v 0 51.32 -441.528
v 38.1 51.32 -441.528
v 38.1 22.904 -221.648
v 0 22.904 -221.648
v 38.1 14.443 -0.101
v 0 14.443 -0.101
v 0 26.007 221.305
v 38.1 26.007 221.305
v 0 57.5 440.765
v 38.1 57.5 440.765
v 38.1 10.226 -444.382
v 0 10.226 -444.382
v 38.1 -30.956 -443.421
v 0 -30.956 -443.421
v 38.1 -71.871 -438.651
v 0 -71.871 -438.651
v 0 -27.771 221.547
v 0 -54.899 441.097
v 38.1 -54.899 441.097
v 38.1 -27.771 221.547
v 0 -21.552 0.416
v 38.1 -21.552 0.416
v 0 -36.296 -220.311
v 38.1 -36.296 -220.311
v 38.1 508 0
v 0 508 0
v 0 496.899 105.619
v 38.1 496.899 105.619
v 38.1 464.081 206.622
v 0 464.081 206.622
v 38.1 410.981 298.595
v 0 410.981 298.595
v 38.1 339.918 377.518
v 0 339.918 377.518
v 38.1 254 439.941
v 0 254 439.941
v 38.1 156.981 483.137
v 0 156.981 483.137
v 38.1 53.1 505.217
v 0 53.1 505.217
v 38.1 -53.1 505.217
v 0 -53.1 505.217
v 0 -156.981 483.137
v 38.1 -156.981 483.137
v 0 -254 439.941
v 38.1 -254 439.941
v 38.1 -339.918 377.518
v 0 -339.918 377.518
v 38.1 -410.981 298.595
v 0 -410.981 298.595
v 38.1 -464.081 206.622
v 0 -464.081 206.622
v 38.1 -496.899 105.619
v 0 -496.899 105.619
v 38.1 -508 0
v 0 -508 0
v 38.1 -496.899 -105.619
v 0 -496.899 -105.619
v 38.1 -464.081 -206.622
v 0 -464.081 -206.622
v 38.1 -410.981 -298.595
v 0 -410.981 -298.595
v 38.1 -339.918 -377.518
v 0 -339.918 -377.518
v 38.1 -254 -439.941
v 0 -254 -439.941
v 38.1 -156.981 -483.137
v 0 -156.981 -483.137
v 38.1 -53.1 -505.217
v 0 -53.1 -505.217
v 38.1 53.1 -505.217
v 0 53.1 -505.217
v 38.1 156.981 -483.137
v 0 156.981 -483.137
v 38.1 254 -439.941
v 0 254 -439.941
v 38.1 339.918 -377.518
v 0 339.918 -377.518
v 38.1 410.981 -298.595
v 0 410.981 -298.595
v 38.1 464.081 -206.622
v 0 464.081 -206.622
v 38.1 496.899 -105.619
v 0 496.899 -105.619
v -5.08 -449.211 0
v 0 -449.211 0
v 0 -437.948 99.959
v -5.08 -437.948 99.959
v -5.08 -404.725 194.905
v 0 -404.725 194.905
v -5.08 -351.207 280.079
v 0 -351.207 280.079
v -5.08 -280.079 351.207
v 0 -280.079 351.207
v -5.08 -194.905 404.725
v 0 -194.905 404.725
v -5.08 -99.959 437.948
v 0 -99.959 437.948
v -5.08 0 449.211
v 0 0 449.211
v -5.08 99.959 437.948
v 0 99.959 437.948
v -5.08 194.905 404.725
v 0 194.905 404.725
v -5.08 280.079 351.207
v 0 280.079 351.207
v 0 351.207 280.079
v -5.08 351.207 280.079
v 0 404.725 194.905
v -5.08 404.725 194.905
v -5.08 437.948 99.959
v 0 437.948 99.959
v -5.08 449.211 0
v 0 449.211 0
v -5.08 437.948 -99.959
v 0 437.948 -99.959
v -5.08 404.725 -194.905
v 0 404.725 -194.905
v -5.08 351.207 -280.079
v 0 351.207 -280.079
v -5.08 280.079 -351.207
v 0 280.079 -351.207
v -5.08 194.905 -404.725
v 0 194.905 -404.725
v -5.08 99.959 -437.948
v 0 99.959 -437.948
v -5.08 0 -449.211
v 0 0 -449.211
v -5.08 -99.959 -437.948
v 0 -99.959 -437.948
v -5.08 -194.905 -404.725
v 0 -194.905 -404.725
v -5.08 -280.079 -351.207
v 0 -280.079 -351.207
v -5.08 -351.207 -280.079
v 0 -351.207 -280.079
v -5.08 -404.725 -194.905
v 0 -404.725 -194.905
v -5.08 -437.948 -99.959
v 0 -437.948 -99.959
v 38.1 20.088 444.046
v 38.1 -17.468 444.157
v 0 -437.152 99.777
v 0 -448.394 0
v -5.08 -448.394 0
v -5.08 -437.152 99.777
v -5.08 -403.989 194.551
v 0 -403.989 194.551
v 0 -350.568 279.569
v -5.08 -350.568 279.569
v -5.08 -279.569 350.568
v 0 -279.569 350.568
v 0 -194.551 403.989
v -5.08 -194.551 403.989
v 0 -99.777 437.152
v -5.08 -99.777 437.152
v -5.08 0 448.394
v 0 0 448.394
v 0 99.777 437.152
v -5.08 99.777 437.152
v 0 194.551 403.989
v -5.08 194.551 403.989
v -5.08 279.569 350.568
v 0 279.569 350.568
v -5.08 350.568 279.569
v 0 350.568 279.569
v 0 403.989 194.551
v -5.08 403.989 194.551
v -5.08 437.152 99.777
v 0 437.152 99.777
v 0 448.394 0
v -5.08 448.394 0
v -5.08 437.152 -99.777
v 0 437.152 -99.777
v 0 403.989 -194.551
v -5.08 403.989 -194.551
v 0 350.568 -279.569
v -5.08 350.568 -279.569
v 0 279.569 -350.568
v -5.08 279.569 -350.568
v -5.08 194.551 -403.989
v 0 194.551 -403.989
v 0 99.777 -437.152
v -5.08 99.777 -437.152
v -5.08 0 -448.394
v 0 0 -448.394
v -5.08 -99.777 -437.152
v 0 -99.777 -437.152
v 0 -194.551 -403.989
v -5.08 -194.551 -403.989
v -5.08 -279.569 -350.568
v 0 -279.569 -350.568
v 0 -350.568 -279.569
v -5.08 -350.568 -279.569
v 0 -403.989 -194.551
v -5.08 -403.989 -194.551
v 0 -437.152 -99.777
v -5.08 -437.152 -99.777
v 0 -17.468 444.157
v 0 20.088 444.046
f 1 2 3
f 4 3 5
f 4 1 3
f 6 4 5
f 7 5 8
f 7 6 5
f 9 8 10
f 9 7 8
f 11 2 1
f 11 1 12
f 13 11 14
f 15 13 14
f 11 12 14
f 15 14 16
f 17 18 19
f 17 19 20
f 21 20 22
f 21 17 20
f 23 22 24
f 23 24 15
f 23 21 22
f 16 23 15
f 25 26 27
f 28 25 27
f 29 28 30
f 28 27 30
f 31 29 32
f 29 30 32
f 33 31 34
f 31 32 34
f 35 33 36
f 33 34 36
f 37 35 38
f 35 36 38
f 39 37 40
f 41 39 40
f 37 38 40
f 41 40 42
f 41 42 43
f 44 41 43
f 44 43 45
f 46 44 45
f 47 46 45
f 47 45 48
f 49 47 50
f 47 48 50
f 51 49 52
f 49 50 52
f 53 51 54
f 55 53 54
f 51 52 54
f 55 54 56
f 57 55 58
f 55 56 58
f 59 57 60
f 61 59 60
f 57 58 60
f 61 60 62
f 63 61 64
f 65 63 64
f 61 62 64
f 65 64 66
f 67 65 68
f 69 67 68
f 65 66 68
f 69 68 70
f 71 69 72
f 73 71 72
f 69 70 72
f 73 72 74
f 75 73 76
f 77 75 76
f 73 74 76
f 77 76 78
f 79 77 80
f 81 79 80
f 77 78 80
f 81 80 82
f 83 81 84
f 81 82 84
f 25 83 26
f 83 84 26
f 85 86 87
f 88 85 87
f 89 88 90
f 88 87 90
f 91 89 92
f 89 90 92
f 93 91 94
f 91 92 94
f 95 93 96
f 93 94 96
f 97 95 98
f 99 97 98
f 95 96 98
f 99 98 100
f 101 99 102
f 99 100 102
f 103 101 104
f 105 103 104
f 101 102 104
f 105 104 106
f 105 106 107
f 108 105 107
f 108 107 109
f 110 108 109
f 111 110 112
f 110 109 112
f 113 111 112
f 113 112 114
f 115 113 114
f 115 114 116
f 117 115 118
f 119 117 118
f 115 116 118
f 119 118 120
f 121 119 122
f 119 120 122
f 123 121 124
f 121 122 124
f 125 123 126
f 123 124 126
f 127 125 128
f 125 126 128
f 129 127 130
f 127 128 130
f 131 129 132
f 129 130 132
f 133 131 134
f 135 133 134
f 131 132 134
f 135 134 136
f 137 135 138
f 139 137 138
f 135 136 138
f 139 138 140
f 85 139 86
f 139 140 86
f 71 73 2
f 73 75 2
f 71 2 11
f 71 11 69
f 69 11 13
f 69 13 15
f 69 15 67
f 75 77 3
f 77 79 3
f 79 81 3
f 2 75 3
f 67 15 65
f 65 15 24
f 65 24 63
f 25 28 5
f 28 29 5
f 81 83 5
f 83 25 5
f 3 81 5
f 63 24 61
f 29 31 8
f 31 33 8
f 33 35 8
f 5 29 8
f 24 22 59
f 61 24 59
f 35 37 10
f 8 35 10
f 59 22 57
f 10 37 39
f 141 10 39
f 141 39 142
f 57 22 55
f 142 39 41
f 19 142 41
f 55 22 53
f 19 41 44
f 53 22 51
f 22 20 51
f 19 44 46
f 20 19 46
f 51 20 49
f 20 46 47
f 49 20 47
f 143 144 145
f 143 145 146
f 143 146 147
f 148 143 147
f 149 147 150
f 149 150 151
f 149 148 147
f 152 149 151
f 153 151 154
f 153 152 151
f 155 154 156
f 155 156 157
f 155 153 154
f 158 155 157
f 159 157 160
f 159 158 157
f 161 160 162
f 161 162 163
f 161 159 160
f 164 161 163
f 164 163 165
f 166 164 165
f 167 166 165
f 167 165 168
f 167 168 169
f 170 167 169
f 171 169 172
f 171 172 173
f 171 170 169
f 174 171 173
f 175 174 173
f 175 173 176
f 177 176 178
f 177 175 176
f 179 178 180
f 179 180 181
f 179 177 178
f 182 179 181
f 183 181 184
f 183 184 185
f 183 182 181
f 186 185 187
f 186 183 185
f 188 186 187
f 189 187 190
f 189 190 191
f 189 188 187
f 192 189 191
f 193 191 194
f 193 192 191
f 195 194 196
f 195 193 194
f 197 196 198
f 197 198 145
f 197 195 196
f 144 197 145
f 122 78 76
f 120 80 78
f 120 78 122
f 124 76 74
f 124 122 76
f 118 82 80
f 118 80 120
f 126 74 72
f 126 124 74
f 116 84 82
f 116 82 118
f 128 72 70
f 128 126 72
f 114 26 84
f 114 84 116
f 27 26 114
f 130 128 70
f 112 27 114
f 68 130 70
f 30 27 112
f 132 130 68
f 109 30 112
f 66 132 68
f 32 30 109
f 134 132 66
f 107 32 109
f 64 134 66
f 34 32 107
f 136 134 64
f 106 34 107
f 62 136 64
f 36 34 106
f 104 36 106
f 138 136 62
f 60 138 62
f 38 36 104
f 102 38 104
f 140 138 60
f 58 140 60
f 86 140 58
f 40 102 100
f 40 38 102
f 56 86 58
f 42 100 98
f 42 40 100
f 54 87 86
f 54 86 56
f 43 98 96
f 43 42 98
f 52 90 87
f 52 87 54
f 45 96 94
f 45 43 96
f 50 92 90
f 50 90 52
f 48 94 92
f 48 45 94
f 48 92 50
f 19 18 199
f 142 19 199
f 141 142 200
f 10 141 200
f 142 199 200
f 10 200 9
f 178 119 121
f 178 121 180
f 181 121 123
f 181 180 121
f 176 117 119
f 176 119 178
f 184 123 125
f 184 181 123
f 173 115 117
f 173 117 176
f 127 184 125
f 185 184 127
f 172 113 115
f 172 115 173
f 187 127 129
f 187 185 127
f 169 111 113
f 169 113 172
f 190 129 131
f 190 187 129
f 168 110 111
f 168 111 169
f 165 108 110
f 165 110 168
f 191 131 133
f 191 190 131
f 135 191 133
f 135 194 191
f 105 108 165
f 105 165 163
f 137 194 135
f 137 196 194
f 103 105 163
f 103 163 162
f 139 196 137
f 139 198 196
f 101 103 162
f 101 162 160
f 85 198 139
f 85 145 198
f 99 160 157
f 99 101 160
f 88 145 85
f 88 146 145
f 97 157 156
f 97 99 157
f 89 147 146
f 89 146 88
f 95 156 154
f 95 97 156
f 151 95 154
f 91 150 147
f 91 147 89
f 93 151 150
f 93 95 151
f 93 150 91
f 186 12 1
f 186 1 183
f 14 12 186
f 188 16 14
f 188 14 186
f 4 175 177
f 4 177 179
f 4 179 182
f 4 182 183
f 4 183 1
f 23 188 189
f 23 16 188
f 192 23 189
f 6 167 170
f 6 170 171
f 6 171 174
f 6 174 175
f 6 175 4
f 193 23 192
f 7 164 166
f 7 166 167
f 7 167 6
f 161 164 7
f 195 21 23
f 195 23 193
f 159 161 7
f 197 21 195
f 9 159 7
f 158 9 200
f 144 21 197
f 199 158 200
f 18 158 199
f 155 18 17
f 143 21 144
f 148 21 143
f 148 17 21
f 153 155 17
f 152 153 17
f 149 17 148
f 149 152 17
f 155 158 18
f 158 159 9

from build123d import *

# Parameters (mm, degrees)
F0_R     = 508
F1_DEPTH = 38.1
F4_D     = 889
F6_DEPTH = 38.1
F7_R     = 449.2110909422
F7_R_2   = 448.3937142921
F8_DEPTH = 5.08


with BuildPart() as f1:
    # F0 (on Right) → F1 (new body)
    with BuildSketch(Plane.YZ):
        Circle(F0_R)
    extrude(amount=F1_DEPTH)

    # F4 (through all)
    with Locations(Plane.YZ.offset(38.1)):
        with Locations((0, 0)):
            Hole(F4_D / 2)

    # F5 (on face) → F6 (join)
    with BuildSketch(Plane(origin=(0, 0, 0), x_dir=(0, -1, 0), z_dir=(-1, 0, 0))):
        with BuildLine():
            ThreePointArc((444.5, 0), (333.1536714942, 294.2598871235), (54.8987348933, 441.0967908601))
            ThreePointArc((54.8987348933, 441.0967908601), (21.5516885972, 0.4157843691), (71.8712062792, -438.6510910826))
            ThreePointArc((71.8712062792, -438.6510910826), (338.767620347, -287.7789940292), (444.5, 0))
        make_face()
        with BuildLine():
            ThreePointArc((-51.3196943653, -441.5275064707), (-14.4431317717, -0.1011743755), (-57.5001694311, 440.7652215357))
            ThreePointArc((-57.5001694311, 440.7652215357), (-444.4890945371, -3.1136534152), (-51.3196943653, -441.5275064707))
        make_face()
    extrude(amount=-F6_DEPTH)

    # F7 (on face) → F8 (join)
    with BuildSketch(Plane(origin=(0, 0, 0), x_dir=(0, -1, 0), z_dir=(-1, 0, 0))):
        Circle(F7_R)
        Circle(F7_R_2, mode=Mode.SUBTRACT)
    extrude(amount=F8_DEPTH)


solid = f1.part
